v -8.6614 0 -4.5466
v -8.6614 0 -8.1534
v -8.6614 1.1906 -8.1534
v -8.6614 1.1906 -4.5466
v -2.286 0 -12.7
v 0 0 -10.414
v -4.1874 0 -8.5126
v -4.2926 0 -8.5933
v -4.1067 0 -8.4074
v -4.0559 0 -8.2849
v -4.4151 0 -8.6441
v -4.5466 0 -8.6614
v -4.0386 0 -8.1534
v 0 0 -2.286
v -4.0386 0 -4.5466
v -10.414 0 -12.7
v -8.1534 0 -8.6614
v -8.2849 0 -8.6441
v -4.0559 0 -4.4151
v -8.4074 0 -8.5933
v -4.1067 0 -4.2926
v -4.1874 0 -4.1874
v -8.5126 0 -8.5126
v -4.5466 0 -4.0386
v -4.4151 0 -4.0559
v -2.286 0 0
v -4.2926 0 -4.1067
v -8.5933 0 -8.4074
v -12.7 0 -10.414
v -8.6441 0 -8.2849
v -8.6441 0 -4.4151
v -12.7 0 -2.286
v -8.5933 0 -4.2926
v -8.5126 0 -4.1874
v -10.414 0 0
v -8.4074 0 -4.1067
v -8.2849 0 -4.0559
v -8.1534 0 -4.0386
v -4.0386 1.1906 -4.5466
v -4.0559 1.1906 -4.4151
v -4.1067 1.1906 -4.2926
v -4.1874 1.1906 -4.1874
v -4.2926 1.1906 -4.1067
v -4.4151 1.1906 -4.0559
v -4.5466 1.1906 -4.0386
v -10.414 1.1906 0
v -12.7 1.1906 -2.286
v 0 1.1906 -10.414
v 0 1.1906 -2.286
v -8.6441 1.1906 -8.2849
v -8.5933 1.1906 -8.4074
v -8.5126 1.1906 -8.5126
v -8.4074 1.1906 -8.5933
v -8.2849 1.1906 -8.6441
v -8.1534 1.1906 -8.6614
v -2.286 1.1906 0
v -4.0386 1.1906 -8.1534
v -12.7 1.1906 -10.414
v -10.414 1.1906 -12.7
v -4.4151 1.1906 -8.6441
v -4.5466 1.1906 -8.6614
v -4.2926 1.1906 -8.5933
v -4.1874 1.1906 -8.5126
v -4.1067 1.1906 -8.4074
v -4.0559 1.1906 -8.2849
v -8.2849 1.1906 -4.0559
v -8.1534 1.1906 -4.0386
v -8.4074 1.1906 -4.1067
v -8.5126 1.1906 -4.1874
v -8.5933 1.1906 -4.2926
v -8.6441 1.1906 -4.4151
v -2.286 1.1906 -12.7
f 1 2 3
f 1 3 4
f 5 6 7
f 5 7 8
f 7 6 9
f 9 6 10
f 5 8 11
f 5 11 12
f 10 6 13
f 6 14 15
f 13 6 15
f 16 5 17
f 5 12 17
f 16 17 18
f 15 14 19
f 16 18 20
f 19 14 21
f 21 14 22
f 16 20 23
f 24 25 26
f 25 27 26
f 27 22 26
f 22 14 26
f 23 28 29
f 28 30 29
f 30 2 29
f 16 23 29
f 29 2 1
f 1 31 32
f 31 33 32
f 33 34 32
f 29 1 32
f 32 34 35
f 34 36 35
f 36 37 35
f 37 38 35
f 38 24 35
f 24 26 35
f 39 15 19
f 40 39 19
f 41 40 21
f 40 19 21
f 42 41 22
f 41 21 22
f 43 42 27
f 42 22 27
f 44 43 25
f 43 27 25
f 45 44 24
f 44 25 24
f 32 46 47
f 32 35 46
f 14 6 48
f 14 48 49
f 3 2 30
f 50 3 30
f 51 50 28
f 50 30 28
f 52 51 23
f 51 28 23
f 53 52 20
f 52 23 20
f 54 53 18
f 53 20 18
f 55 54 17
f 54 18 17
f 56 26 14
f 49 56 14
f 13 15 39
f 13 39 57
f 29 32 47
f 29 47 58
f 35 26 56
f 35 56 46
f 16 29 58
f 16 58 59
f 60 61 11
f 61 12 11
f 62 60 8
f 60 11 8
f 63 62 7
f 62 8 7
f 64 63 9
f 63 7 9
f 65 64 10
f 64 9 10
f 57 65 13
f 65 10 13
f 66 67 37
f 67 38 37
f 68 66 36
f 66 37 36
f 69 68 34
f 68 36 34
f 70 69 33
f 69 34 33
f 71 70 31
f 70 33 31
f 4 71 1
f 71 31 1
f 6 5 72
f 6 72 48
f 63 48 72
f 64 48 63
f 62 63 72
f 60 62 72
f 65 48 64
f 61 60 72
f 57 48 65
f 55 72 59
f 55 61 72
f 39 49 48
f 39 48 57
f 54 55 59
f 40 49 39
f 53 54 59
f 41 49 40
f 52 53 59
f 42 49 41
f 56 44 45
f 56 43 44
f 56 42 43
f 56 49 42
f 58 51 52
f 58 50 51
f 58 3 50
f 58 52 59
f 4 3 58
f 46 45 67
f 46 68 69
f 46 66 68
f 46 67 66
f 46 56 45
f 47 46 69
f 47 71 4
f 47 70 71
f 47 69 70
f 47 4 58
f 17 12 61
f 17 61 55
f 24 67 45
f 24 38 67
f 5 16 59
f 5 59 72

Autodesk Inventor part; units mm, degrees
ref_plane "YZ Plane" through (0, 0, 0) normal (1, 0, 0) x (0, 1, 0)
ref_plane "XZ Plane" through (0, 0, 0) normal (0, 1, 0) x (-1, 0, 0)
ref_plane "XY Plane" through (0, 0, 0) normal (0, 0, 1) x (1, 0, 0)
sketch "Sketch1" plane through (0, 0, 0) normal (0, 1, 0) x (-1, 0, 0)
  line L0 (2.286, 0) -> (10.414, 0)
  line L1 (12.7, -2.286) -> (12.7, -10.414)
  line L2 (10.414, -12.7) -> (2.286, -12.7)
  line L3 (0, -10.414) -> (0, -2.286)
  line L4 (8.1534, -4.0386) -> (4.5466, -4.0386)
  line L5 (4.0386, -4.5466) -> (4.0386, -8.1534)
  line L6 (4.5466, -8.6614) -> (8.1534, -8.6614)
  line L7 (8.6614, -8.1534) -> (8.6614, -4.5466)
  line L8 (10.414, 0) -> (12.7, -2.286)
  line L9 (12.7, -10.414) -> (10.414, -12.7)
  line L10 (2.286, -12.7) -> (0, -10.414)
  line L11 (2.286, 0) -> (0, -2.286)
  arc A0 (8.6614, -4.5466) -> (8.1534, -4.0386) centre (8.1534, -4.5466) ccw
  arc A1 (8.1534, -8.6614) -> (8.6614, -8.1534) centre (8.1534, -8.1534) ccw
  arc A2 (4.0386, -8.1534) -> (4.5466, -8.6614) centre (4.5466, -8.1534) ccw
  arc A3 (4.5466, -4.0386) -> (4.0386, -4.5466) centre (4.5466, -4.5466) ccw
  line L12 (8.1534, -4.5466) -> (4.5466, -8.1534) construction
  line L13 (12.7, -10.414) -> (0, -2.286) construction
  point P0 (0, 0)
  point P1 (12.7, -12.7)
  point P2 (12.7, 0)
  point P3 (0, -12.7)
  point P4 (4.0386, -8.6614)
  point P5 (8.6614, -8.6614)
  point P6 (6.35, -6.35)
  dimension "d1" = 12.7
  dimension "d2" = 4.6228
  dimension "d3" = 2.286
  dimension "d4" = 2.286
  dimension "d5" = 2.286
  dimension "d6" = 2.286
  dimension "d7" = 2.286
  dimension "d8" = 2.286
  dimension "d9" = 2.286
  dimension "d10" = 2.286
  dimension "d11" = 0.508
extrude "Body" add sketch "Sketch1" along normal blind 1.1906
sketch "Sketch2" plane through (0, 1.1906, 0) normal (0, 1, 0) x (1, 0, 0)
  arc A0 (-8.1534, 8.6614) -> (-8.6614, 8.1534) centre (-8.1534, 8.1534) ccw construction
  arc A1 (-4.5466, 4.0386) -> (-4.0386, 4.5466) centre (-4.5466, 4.5466) ccw construction
  circle A2 centre (-6.35, 6.35) radius 2.1844
  line L0 (-8.1534, 8.1534) -> (-4.5466, 4.5466) construction
  point P0 (0, 0)
  dimension "d14" = 4.3688
surface extrude "Circle" sketch "Sketch2" against normal up to surface (1.1906 mm away) shown yes curves A2
pattern_of_one "Rectangular Pattern1"
equation "\"d4\" = d3"
equation "\"d5\" = d3"
equation "\"d6\" = d5"
equation "\"d7\" = d3"
equation "\"d8\" = d7"
equation "\"d9\" = d3"
equation "\"d10\" = d9"
equation "\"d22\" = d19"
equation "\"d19\" = 12.7"
